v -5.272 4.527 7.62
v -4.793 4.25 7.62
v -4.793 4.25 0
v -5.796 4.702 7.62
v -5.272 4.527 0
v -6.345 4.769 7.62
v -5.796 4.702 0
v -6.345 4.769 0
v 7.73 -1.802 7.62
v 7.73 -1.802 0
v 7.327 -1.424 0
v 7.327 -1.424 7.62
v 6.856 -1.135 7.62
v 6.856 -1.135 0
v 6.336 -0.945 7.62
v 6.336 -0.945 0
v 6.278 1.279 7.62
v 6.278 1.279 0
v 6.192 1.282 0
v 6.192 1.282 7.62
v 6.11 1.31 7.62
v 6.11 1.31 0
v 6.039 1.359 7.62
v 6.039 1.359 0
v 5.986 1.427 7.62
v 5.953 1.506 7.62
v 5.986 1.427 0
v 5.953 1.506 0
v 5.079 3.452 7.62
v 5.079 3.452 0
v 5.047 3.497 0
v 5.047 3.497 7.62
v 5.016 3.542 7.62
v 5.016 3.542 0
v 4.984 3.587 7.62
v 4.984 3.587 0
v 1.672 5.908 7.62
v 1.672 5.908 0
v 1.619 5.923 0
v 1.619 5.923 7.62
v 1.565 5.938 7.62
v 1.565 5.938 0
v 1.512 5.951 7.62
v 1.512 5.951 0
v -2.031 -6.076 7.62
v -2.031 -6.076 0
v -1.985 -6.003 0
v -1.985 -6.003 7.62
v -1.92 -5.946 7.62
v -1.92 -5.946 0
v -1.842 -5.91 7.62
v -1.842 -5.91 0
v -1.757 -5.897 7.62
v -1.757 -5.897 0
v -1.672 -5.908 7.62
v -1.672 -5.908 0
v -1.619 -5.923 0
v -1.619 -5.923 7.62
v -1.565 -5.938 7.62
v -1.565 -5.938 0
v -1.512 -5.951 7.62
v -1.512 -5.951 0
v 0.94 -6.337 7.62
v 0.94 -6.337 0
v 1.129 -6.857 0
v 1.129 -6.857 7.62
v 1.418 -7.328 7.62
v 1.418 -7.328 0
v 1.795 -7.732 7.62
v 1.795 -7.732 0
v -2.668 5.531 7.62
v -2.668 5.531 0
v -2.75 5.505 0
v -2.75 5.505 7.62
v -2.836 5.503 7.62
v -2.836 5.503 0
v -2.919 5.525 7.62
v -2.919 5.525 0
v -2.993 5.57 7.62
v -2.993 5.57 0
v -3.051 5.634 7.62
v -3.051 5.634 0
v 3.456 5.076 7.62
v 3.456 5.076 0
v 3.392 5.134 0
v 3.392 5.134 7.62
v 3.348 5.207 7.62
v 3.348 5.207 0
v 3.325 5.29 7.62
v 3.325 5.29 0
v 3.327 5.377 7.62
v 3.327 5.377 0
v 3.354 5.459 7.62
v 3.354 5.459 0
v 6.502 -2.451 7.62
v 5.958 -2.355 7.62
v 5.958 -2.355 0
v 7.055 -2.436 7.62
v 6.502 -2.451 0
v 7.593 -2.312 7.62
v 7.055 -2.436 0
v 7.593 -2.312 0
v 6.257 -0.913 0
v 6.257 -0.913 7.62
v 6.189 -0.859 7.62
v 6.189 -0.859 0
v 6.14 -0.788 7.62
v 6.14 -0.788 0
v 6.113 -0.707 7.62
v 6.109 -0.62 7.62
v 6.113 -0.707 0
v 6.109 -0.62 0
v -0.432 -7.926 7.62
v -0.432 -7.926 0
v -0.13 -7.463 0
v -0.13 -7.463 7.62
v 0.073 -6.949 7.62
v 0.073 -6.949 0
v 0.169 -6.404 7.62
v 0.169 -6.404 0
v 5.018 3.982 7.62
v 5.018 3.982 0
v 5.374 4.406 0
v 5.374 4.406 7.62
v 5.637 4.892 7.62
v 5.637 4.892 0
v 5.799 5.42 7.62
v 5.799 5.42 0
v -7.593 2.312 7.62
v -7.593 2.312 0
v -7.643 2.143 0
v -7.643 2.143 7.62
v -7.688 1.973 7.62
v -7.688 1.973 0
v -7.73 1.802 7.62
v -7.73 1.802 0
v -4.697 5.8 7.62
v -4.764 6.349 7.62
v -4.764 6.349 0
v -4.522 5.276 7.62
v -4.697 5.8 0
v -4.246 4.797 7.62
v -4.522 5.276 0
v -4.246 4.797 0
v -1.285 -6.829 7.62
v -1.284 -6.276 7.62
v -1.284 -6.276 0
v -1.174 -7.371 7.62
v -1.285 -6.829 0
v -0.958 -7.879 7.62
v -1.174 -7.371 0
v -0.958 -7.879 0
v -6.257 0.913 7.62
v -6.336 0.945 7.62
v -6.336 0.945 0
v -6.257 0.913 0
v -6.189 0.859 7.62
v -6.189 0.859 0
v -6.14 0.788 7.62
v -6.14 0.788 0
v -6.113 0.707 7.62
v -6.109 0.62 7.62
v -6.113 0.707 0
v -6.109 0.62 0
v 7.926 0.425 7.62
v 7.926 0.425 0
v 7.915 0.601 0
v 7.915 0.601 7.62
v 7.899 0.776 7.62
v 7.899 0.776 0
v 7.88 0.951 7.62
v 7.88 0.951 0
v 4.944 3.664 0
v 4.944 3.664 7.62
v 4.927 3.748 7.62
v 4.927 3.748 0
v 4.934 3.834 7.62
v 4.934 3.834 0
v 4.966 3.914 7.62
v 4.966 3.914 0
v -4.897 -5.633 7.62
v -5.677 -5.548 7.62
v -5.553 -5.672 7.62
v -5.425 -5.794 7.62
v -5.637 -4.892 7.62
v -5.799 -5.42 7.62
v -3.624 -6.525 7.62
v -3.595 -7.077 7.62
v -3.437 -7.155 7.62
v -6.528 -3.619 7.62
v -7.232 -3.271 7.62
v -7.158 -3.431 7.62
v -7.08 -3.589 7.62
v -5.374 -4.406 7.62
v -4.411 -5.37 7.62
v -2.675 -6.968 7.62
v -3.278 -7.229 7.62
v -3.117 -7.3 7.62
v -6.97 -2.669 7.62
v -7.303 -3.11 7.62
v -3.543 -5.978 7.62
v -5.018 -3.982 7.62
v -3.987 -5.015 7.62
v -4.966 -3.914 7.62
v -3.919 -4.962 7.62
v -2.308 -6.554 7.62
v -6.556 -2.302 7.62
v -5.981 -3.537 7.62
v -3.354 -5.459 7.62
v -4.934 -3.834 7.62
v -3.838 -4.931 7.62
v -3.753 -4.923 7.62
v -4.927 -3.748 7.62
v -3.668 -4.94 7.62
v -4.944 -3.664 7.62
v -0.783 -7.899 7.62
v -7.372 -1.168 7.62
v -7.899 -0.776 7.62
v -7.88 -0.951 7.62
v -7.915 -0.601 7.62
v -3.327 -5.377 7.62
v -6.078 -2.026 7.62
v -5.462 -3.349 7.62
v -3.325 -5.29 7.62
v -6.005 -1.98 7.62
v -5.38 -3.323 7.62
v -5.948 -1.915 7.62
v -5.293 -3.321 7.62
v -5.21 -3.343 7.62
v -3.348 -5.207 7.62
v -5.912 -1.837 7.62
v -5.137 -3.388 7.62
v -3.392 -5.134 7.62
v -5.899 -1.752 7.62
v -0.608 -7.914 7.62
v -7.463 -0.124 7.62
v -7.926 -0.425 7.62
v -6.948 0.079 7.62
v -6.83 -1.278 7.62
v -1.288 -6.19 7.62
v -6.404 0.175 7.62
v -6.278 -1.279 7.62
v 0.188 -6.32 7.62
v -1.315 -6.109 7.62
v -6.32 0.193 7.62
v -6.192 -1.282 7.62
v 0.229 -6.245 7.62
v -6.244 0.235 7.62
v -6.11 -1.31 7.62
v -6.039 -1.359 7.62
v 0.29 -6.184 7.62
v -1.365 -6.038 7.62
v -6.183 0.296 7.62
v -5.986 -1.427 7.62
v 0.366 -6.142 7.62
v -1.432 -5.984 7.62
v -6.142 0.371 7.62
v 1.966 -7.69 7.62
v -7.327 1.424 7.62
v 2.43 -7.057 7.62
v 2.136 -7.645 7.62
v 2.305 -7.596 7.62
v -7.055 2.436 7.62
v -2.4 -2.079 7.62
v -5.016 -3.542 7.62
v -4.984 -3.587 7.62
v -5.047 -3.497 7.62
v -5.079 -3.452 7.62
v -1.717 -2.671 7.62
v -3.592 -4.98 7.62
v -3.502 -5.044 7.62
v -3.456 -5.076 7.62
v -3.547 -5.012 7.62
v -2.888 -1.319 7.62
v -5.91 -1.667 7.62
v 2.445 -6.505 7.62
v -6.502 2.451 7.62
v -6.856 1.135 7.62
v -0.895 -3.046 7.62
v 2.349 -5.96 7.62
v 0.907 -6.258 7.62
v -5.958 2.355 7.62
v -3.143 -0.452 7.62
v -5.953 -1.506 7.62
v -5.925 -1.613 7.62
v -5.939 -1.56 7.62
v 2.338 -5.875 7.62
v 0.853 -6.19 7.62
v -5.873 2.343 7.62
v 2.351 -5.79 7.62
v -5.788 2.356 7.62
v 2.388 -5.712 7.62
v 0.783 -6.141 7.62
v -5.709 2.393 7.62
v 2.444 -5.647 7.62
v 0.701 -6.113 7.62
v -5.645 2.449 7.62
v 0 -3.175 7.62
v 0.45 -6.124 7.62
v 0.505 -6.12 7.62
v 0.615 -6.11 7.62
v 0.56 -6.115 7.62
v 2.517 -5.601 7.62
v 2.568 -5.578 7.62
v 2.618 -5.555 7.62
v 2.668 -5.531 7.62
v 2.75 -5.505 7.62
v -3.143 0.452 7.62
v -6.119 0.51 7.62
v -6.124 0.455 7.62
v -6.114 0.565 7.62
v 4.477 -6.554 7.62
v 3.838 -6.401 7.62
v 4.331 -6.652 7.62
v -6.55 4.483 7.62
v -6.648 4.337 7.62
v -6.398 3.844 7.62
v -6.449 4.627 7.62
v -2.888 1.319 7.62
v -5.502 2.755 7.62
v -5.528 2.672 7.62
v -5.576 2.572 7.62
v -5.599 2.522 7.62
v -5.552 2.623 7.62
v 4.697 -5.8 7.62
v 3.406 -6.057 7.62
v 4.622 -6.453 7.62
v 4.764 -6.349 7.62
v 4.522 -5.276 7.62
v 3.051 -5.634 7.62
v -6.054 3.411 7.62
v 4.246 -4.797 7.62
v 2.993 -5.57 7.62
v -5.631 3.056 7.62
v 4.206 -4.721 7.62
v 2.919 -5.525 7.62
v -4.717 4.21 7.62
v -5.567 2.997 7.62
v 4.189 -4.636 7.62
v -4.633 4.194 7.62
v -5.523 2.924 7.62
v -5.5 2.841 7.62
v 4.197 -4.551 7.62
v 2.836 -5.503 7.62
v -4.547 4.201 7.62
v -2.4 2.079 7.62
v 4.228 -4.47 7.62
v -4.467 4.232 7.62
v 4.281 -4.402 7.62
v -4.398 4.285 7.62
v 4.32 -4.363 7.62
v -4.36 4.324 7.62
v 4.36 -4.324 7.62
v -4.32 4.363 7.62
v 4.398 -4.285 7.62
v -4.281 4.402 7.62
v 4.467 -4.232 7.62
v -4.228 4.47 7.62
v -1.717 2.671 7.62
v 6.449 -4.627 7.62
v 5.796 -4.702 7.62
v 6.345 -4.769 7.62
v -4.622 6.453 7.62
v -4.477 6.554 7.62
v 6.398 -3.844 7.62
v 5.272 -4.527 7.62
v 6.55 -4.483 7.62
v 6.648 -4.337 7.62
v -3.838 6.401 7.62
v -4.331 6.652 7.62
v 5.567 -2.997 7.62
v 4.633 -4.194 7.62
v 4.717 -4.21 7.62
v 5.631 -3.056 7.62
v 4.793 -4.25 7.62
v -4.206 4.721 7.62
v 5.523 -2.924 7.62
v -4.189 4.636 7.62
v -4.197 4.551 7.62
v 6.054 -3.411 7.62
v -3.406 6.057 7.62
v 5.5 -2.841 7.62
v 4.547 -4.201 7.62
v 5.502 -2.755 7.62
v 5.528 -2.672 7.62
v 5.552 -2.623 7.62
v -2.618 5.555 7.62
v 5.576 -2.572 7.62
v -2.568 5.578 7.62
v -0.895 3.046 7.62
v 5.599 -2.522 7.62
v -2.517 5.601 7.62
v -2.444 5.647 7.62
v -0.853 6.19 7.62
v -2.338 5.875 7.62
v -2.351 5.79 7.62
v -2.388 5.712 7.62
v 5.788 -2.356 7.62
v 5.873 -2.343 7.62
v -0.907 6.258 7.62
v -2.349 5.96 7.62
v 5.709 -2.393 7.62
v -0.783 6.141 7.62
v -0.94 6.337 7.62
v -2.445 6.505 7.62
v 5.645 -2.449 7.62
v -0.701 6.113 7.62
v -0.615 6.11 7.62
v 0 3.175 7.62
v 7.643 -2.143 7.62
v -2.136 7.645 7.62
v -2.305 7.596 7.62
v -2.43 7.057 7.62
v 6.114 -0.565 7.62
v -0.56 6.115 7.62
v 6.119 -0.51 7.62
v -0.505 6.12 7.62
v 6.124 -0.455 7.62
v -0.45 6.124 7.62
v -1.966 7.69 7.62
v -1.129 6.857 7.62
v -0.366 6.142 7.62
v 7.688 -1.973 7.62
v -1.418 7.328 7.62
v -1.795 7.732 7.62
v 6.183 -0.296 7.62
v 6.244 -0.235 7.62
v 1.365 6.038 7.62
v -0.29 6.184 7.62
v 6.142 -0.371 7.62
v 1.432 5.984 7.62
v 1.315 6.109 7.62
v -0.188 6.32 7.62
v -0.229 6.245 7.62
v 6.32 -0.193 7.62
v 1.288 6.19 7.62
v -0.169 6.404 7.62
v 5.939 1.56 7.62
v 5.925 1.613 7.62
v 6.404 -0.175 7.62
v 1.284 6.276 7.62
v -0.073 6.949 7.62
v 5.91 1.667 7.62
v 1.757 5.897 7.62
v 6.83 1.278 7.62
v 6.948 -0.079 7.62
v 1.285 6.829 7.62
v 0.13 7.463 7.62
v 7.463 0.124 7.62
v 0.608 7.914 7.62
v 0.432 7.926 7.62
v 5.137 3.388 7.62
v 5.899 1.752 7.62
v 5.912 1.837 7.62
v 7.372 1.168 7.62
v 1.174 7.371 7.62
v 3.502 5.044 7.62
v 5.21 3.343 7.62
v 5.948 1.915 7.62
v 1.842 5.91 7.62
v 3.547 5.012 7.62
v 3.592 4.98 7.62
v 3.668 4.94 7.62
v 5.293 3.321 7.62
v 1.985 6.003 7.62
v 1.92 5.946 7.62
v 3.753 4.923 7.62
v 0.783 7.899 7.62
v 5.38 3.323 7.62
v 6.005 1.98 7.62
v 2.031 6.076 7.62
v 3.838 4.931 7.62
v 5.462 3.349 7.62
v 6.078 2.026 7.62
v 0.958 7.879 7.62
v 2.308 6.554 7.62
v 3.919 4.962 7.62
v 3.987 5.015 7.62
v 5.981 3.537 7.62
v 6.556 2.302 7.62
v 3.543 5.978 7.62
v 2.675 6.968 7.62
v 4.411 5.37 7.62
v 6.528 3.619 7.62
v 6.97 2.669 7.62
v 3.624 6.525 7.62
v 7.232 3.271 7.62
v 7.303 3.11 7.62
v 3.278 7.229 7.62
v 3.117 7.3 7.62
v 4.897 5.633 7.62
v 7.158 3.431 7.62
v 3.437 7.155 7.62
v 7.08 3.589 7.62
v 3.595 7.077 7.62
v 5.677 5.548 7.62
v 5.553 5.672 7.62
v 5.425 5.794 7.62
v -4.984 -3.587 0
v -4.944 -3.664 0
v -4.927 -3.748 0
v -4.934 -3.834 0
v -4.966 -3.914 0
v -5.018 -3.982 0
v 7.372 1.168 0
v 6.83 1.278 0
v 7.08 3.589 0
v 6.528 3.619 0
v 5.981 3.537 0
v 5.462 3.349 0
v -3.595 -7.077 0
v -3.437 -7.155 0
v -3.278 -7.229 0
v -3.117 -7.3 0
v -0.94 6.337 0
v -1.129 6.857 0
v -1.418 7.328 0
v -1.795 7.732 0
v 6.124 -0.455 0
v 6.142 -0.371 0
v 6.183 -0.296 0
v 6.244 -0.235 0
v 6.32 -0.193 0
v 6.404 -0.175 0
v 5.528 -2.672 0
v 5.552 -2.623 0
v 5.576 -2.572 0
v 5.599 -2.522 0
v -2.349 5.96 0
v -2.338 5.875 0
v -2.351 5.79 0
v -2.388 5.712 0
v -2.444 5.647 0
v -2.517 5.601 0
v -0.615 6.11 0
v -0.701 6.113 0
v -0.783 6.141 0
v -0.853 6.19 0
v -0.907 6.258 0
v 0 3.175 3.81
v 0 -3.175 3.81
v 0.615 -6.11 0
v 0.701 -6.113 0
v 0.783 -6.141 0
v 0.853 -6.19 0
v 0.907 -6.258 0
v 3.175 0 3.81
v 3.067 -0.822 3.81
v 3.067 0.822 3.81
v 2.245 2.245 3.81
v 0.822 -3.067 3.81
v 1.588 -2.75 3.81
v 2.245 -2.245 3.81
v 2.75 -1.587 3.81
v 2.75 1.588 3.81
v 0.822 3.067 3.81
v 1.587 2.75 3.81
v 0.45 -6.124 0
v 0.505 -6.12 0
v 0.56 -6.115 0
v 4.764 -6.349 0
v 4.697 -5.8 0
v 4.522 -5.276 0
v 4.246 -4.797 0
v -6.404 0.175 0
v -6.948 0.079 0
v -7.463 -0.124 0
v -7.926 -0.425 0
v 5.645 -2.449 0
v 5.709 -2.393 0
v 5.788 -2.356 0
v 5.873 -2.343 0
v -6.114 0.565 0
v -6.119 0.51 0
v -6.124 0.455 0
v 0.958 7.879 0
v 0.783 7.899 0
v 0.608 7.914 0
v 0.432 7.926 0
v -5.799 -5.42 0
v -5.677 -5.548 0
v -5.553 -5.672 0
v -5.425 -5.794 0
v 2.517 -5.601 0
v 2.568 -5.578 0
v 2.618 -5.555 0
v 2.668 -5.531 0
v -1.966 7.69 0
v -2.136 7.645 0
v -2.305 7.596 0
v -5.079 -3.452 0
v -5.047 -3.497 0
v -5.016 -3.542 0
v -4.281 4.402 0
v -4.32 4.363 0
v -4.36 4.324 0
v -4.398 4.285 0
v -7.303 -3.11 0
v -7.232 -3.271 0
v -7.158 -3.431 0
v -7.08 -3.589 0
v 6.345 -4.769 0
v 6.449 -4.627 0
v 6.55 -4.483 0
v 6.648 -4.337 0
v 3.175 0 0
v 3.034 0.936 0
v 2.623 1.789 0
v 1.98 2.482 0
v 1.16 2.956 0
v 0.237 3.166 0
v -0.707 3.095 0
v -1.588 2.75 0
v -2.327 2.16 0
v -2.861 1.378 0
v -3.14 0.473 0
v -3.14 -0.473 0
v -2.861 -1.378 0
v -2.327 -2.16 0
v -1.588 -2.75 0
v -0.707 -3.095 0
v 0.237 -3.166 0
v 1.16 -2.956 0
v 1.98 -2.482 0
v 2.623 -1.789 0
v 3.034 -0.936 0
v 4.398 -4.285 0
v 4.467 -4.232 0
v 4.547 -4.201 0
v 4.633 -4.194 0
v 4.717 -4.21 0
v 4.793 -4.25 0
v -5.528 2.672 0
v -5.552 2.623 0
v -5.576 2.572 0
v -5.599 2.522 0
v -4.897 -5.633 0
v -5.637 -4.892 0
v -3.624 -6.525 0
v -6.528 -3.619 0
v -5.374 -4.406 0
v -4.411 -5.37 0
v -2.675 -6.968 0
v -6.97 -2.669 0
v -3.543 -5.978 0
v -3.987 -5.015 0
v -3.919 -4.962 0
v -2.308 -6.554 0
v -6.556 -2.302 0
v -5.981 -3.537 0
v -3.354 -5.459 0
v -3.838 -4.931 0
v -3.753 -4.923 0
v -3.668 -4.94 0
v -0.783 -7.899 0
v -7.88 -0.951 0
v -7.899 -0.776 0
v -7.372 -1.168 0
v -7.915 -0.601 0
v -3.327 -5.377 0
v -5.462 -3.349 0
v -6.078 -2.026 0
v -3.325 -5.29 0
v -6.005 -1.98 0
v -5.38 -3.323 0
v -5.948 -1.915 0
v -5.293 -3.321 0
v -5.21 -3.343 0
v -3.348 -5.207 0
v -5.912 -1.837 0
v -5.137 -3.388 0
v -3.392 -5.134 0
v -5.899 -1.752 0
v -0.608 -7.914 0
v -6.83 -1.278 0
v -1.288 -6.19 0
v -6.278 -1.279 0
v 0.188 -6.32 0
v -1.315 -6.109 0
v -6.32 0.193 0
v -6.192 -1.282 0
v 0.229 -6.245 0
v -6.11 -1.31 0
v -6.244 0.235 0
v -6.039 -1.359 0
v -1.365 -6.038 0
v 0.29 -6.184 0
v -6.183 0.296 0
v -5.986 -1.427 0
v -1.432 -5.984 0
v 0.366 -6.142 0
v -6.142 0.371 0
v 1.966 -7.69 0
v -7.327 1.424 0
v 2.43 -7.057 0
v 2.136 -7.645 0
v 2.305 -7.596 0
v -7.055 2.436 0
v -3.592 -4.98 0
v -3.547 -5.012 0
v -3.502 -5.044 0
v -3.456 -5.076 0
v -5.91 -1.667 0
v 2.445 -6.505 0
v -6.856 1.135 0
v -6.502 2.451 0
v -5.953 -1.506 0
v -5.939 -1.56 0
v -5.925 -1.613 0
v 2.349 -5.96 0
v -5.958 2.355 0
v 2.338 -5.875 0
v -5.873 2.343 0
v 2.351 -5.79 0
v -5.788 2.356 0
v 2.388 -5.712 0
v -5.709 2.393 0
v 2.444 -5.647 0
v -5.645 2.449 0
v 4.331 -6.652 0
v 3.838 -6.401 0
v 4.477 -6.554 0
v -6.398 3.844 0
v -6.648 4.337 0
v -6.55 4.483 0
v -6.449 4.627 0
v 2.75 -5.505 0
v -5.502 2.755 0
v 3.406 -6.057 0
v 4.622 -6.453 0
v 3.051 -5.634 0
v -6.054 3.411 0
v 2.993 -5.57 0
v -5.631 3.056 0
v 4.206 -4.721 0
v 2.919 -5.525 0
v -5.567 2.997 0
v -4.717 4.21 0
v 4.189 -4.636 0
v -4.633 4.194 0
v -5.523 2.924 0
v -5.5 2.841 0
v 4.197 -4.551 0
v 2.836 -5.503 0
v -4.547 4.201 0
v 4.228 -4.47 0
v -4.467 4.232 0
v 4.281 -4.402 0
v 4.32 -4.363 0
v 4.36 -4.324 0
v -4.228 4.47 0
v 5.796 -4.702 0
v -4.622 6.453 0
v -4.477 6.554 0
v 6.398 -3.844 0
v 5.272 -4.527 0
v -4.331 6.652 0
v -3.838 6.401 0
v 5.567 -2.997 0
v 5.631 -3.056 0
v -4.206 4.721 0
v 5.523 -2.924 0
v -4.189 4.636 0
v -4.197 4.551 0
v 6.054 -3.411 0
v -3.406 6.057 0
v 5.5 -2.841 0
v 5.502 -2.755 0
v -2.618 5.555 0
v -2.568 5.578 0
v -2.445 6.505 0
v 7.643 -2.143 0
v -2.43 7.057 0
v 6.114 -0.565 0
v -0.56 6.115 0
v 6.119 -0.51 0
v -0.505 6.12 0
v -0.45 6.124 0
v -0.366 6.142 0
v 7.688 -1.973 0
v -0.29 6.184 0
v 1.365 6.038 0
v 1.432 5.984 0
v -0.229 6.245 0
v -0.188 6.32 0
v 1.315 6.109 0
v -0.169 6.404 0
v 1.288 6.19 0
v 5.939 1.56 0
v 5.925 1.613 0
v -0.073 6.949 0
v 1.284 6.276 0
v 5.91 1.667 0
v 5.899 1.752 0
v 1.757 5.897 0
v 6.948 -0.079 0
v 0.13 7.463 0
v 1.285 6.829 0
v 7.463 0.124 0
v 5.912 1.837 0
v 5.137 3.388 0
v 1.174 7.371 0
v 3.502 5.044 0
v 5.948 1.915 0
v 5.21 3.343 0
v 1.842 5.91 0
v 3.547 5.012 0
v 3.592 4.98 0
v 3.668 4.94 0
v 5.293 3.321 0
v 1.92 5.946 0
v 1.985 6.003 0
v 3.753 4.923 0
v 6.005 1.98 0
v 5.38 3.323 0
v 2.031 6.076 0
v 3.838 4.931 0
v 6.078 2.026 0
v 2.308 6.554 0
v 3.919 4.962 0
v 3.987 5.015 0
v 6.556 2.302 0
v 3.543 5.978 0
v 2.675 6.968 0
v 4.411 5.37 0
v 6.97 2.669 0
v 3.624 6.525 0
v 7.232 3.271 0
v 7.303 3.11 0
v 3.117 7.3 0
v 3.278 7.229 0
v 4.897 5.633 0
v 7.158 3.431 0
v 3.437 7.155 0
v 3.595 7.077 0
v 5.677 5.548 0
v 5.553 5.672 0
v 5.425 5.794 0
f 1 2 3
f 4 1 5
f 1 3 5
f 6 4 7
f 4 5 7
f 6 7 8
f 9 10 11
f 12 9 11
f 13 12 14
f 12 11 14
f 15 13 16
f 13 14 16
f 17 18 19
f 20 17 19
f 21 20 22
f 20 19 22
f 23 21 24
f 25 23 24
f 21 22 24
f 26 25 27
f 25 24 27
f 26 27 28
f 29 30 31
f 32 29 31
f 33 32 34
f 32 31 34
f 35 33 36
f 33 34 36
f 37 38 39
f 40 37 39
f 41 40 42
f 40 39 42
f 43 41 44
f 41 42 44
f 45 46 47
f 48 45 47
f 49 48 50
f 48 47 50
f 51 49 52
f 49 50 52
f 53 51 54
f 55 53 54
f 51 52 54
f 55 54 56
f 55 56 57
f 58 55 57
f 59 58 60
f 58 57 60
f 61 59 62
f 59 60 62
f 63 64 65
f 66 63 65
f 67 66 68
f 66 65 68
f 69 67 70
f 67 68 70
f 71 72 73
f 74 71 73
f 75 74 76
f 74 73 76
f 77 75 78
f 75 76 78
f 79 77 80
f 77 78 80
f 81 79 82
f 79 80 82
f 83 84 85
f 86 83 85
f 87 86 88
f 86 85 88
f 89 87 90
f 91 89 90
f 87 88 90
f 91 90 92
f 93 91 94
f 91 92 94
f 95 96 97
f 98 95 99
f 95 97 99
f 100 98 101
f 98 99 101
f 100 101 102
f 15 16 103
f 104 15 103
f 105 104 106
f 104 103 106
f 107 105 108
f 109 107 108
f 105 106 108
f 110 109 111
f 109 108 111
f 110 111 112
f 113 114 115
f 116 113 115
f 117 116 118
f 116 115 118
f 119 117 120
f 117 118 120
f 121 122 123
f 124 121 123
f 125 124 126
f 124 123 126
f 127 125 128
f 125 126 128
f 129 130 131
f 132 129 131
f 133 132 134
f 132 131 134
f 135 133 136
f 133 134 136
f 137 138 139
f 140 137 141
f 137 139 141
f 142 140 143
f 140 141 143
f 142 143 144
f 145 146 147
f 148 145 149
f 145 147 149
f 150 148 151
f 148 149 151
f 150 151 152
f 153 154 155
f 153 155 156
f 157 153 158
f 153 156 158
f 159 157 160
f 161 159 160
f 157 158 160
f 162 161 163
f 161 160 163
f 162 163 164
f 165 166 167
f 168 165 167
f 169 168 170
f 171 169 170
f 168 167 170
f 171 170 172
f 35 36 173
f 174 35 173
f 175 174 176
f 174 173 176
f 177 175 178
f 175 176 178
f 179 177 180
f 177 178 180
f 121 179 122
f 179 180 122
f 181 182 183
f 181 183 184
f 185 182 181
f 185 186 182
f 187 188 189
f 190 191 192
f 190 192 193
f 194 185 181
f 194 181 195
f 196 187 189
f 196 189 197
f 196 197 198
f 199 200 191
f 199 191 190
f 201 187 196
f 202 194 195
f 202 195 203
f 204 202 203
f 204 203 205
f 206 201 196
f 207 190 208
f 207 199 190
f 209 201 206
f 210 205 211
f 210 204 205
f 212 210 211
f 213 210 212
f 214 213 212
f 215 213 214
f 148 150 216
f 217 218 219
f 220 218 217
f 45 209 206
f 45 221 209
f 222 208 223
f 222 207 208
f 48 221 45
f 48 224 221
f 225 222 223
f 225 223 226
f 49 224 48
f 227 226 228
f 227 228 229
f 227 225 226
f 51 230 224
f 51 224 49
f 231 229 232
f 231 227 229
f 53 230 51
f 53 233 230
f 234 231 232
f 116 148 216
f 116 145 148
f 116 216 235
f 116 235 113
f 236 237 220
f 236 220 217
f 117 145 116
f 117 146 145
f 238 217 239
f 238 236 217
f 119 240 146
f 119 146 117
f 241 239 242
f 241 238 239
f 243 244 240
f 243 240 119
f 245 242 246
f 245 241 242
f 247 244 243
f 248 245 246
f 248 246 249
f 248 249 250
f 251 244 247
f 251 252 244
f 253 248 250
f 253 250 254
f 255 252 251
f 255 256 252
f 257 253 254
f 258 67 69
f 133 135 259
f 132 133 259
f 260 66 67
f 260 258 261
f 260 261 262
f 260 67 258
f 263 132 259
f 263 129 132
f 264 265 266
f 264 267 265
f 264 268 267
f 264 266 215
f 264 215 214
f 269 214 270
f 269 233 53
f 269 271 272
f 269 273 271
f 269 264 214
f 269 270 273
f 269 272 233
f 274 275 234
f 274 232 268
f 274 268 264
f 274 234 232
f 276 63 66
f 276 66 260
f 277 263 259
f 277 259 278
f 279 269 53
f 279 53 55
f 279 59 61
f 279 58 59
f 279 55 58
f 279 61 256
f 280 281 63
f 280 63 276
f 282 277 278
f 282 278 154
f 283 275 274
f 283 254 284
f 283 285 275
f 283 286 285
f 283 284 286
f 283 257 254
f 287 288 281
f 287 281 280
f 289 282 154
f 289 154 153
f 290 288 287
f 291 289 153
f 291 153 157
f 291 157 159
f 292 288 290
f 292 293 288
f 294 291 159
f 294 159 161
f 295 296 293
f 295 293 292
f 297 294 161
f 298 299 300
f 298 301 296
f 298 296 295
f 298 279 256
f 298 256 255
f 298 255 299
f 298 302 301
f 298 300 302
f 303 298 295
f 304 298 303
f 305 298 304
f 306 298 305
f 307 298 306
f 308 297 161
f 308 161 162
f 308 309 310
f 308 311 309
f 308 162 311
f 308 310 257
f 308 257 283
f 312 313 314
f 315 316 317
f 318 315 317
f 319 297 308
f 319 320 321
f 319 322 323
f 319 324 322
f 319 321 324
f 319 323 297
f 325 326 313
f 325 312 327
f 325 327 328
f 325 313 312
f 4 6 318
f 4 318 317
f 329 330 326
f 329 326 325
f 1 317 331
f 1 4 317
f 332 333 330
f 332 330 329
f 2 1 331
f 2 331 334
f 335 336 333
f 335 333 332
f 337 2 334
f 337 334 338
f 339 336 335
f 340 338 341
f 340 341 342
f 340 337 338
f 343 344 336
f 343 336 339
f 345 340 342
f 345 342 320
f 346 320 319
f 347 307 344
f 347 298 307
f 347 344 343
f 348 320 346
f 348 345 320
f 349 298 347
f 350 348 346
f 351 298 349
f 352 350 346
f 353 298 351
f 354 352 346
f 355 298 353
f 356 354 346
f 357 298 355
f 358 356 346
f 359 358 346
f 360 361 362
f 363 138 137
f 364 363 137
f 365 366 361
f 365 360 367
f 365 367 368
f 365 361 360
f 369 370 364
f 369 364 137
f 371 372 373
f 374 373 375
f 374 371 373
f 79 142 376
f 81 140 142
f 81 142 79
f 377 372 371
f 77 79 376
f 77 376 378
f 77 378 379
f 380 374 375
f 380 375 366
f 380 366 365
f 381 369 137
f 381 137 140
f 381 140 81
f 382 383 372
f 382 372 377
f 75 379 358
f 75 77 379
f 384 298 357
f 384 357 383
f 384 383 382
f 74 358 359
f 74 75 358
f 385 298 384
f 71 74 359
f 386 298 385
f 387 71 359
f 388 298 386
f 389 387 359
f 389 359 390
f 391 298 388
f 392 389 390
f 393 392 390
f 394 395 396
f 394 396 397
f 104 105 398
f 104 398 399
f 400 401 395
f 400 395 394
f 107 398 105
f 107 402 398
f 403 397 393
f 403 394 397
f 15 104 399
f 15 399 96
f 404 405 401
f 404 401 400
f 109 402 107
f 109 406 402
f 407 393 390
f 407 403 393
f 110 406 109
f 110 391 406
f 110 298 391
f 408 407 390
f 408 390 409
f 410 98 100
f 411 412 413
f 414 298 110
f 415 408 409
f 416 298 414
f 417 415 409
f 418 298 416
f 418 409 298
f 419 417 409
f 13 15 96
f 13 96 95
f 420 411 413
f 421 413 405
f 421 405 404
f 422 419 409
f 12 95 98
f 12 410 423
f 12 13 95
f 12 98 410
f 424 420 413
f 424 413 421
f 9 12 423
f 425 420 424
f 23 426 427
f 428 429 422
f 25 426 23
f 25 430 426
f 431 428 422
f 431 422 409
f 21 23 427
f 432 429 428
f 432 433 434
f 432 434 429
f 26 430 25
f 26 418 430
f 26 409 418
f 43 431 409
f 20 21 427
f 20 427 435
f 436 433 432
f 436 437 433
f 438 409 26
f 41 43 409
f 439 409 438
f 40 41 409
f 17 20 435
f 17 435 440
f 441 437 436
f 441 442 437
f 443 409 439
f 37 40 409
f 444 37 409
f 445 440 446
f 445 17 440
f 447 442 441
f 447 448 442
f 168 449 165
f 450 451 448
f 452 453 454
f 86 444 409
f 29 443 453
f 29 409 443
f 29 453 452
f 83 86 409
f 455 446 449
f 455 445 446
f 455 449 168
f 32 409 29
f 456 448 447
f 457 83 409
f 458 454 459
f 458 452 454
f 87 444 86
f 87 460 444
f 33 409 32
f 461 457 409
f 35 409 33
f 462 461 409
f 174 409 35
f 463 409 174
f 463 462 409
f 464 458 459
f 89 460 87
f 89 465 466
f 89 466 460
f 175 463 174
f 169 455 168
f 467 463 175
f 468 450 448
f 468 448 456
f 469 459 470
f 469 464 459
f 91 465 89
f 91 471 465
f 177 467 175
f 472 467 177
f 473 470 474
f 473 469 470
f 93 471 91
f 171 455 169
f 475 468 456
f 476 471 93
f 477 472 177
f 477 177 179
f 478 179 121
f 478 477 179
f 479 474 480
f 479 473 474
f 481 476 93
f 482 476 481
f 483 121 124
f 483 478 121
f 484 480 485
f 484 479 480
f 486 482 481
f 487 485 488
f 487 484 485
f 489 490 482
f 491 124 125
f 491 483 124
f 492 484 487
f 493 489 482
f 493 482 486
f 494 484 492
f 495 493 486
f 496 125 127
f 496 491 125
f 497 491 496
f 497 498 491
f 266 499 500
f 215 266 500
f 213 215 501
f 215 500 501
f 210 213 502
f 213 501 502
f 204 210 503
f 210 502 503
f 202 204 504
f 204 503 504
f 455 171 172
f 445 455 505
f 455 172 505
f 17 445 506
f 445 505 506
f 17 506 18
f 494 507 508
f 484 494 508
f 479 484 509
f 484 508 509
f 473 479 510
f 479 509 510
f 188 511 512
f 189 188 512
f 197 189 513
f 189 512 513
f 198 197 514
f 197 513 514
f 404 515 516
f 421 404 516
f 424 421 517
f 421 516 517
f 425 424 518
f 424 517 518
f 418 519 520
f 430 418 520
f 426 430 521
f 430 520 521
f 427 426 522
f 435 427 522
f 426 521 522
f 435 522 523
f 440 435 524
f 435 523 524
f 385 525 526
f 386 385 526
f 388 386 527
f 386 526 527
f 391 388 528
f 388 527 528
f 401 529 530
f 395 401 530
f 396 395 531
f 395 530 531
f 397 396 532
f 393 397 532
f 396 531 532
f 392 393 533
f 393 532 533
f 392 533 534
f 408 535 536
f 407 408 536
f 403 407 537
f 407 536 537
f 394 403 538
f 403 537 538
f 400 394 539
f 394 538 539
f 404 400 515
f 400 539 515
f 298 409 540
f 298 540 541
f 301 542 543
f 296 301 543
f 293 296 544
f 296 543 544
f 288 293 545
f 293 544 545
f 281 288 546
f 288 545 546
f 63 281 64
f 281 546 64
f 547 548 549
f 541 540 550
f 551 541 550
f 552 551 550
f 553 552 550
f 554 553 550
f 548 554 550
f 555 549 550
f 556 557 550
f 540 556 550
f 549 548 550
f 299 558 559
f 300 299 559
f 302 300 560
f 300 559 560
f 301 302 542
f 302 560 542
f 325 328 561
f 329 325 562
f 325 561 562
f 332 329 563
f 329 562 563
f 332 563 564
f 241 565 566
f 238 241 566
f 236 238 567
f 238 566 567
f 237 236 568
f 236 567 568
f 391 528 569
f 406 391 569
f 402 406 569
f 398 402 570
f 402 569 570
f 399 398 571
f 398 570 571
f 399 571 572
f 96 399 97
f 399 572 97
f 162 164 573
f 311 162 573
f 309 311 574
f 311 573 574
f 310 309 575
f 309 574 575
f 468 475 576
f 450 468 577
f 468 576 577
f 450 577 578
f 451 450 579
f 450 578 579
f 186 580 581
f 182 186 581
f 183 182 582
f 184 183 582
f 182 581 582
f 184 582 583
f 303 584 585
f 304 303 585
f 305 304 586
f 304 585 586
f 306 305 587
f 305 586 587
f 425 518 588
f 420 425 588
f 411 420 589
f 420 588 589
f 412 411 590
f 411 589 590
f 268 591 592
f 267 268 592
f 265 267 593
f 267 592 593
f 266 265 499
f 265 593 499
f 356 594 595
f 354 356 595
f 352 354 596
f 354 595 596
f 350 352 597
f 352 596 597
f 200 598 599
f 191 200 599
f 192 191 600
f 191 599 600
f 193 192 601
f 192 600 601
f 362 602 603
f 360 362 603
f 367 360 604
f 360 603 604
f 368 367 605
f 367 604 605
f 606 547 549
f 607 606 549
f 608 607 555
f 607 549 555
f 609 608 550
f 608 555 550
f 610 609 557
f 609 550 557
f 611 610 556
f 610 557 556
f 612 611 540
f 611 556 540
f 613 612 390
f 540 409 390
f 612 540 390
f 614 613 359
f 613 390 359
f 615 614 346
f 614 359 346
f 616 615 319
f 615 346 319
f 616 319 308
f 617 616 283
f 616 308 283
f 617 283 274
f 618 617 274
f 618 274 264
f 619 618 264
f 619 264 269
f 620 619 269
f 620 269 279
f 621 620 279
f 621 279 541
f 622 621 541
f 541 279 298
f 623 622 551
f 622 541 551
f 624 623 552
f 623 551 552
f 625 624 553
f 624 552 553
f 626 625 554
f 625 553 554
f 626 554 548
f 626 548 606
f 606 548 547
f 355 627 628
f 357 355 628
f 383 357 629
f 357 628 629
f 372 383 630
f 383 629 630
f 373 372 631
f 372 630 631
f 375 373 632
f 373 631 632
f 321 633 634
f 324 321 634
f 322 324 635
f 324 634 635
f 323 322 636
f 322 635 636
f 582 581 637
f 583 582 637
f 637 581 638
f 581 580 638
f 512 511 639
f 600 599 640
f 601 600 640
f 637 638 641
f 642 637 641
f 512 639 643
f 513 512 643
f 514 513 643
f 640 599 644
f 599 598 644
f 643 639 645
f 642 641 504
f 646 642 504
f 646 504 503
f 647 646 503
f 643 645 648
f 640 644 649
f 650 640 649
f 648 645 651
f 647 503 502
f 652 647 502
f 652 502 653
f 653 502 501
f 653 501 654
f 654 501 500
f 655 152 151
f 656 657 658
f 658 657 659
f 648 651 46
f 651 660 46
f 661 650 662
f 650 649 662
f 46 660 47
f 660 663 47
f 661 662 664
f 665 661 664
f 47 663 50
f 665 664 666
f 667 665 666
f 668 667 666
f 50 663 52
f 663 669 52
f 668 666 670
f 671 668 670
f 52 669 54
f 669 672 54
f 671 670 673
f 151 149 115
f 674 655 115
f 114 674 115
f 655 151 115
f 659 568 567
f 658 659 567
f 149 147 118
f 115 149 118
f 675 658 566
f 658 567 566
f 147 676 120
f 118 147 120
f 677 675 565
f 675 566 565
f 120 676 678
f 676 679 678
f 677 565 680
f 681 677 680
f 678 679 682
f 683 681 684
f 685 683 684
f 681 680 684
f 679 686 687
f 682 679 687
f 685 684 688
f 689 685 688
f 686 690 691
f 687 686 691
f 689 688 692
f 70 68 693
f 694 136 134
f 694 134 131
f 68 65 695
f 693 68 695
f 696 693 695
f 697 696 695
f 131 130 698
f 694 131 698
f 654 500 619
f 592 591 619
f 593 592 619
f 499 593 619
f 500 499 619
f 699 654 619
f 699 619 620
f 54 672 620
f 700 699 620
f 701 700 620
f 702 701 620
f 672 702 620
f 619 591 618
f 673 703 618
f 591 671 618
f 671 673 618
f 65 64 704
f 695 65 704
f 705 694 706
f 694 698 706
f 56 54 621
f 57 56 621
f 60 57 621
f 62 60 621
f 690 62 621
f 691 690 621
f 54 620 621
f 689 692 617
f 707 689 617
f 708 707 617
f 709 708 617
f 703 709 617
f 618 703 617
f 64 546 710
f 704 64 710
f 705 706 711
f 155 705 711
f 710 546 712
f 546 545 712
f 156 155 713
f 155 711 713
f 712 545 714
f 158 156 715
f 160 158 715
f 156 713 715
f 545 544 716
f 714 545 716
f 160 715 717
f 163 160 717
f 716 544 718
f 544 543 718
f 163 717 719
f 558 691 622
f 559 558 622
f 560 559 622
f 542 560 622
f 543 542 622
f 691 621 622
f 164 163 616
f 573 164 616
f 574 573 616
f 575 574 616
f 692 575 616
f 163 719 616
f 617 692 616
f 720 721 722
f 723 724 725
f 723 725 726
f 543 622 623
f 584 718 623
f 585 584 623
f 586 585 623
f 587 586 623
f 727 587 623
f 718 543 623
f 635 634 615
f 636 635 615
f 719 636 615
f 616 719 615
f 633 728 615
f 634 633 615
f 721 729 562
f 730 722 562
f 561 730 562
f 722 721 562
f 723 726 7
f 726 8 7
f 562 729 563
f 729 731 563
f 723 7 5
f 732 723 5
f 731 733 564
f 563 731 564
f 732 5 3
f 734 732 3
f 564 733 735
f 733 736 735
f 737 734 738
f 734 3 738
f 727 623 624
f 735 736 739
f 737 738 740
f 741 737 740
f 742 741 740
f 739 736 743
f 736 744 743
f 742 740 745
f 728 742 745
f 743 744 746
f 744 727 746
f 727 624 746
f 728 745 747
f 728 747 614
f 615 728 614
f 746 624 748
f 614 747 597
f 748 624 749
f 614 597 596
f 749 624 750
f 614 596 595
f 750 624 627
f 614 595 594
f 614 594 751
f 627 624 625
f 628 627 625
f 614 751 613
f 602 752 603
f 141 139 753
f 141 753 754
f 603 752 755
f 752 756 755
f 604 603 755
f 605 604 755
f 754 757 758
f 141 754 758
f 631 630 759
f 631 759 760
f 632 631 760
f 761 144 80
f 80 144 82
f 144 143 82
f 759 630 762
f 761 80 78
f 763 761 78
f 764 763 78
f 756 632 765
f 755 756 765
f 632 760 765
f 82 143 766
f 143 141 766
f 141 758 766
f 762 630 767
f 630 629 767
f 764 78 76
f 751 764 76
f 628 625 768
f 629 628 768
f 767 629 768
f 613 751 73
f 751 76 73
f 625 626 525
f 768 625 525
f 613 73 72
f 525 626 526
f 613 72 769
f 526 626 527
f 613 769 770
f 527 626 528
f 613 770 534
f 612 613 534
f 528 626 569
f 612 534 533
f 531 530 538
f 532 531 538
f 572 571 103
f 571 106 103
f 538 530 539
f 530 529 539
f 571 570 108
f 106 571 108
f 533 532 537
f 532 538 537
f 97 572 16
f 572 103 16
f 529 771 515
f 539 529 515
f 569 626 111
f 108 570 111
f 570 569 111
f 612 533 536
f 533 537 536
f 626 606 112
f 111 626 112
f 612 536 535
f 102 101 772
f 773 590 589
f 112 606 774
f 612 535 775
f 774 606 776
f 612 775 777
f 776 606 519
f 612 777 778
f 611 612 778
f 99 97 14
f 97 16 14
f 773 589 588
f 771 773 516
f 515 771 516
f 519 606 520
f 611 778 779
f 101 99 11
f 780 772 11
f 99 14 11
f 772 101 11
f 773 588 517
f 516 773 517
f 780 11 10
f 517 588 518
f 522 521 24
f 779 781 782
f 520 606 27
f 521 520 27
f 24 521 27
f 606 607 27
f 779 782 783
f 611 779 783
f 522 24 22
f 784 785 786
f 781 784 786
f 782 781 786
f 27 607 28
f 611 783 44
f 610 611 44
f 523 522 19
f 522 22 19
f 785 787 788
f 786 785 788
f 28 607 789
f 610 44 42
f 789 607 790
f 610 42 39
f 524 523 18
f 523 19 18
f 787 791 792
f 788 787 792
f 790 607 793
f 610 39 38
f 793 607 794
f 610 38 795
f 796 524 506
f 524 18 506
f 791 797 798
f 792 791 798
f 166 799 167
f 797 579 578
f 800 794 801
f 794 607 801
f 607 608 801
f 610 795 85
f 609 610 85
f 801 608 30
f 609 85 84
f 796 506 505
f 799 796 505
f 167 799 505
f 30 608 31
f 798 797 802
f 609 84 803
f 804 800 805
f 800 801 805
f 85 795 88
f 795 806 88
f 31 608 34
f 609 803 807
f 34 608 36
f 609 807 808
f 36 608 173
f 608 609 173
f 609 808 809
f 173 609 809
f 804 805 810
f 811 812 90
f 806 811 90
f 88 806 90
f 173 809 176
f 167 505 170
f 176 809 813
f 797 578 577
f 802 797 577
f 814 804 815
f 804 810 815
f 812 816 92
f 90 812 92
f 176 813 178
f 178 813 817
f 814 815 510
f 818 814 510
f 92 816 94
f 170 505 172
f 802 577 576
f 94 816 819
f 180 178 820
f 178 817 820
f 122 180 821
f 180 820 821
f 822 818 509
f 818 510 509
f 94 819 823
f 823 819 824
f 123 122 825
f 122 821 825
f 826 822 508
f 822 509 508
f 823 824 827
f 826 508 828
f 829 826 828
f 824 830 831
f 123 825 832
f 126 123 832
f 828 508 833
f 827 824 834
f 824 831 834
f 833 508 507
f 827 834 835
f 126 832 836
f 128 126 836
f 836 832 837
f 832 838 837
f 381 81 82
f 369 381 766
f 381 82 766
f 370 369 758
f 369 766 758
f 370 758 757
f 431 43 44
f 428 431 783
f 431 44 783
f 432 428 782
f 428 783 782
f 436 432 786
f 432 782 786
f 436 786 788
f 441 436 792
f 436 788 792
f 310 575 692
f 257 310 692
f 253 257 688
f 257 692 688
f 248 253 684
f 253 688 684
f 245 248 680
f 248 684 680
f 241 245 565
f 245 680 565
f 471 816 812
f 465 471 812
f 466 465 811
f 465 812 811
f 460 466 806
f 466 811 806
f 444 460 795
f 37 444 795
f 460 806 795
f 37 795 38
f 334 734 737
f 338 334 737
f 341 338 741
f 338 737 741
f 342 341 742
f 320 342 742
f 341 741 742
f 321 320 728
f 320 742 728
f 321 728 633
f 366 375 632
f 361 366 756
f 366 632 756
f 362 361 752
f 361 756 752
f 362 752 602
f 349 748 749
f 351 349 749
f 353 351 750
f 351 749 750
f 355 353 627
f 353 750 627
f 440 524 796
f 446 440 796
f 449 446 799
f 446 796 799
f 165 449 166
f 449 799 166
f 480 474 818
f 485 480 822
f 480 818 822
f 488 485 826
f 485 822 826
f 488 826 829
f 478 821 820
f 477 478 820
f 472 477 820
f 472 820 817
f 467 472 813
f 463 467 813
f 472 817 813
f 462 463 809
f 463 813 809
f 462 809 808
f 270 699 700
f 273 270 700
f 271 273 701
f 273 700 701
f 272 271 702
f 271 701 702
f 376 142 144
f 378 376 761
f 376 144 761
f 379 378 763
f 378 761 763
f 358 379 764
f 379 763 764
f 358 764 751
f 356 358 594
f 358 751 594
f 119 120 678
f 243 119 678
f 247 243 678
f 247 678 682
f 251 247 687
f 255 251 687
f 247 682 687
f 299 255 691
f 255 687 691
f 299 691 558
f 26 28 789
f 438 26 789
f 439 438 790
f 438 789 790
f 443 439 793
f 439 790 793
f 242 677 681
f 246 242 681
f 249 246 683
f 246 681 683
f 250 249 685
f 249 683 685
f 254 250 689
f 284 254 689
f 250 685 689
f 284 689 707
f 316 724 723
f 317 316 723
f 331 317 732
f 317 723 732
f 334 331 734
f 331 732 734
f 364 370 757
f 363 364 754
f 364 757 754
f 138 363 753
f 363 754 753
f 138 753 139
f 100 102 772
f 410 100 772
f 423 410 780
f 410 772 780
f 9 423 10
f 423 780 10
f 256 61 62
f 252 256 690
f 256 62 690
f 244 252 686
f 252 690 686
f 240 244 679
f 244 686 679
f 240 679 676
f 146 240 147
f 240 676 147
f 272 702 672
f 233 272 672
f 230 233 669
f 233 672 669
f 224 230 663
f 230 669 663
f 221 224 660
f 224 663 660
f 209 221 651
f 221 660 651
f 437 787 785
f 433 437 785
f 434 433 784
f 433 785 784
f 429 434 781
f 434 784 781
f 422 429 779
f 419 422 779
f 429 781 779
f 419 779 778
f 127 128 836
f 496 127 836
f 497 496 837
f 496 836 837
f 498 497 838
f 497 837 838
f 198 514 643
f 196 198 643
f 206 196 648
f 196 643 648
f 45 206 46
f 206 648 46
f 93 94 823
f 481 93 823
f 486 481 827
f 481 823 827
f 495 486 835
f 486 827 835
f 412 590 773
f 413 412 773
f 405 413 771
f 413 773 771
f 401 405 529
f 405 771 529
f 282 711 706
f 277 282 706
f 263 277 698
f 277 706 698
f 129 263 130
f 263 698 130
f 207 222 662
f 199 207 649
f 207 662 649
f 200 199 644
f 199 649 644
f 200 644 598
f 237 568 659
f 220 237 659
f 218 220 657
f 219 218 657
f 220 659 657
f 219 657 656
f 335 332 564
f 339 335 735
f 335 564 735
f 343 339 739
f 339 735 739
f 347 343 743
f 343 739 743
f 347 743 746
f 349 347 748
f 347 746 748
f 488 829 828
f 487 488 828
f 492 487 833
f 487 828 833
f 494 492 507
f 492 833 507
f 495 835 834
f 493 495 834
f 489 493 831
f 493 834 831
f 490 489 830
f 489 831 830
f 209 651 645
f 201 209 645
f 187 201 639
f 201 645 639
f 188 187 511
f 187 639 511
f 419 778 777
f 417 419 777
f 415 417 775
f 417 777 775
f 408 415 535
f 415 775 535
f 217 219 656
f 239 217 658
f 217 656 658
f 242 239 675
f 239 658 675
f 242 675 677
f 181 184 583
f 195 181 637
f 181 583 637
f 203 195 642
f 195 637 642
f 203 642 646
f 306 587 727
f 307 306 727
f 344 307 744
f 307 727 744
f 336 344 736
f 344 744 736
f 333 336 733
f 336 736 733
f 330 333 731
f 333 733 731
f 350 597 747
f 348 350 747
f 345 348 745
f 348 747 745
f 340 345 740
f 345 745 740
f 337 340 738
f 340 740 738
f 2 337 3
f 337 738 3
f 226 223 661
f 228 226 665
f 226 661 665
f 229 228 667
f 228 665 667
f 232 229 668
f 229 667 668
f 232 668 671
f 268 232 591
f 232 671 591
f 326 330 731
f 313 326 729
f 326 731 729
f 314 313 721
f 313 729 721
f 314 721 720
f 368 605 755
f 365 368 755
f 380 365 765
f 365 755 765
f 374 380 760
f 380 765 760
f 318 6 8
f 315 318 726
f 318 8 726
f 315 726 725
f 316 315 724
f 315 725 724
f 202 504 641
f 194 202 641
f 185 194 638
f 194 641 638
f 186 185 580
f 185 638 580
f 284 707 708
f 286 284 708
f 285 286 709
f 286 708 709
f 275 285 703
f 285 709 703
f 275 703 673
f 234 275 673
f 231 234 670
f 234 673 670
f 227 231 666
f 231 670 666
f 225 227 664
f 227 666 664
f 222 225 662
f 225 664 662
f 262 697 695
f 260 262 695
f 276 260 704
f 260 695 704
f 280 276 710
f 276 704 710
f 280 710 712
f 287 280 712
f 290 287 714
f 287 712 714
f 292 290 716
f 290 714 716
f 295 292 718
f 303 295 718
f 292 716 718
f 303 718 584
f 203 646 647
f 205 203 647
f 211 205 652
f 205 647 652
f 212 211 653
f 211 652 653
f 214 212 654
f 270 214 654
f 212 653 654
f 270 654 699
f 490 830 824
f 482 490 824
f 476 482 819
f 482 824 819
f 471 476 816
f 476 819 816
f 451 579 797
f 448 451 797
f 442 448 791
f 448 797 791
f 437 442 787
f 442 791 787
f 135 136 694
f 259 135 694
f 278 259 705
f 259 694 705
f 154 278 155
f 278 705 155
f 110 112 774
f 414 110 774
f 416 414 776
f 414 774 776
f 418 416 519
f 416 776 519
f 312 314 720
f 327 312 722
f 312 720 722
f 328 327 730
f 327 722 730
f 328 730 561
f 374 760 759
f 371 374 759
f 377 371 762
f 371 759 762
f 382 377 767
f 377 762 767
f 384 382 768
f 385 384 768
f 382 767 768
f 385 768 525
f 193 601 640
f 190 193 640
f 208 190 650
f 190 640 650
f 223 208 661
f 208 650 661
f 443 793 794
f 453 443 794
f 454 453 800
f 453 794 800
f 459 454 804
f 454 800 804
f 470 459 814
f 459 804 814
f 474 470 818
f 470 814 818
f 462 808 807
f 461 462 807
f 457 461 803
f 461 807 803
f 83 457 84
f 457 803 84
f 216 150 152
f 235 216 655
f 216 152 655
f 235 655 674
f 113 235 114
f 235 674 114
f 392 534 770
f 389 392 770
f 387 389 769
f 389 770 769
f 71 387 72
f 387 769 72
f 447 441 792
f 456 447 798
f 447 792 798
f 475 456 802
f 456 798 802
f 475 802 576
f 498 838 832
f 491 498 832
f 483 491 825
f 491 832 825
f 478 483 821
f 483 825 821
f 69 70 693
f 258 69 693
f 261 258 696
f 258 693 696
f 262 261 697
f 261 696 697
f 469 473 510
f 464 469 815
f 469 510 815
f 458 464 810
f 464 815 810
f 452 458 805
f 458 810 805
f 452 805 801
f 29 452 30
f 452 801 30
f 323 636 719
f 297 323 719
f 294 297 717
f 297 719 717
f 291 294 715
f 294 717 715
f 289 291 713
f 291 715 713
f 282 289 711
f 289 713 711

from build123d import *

# Parameters (mm, degrees)
SKETCH3_R           = 7.9375
GEARBODY_DEPTH      = 7.62
TOOTHCUT_DEPTH      = 8.62
CIRPATTERN1_COUNT   = 18
BOREDIA_R           = 3.175
BORE_DEPTH          = 12700
BOSS_EXTRUDE1_DEPTH = 3.81


with BuildPart() as part:
    # Sketch3 → gearBody (new body)
    with BuildSketch(Plane.XY):
        Circle(SKETCH3_R)
    extrude(amount=GEARBODY_DEPTH)

    # Sketch2 → toothCut (cut, through all)
    with BuildSketch(Plane.XY):
        with BuildLine():
            ThreePointArc((6.109024448, -0.620440562), (6.116845087, -0.537896263), (6.123550449, -0.45525389))
            ThreePointArc((6.123550449, -0.45525389), (6.211734547, -0.262957543), (6.404089586, -0.174901543))
            ThreePointArc((6.404089586, -0.174901543), (7.575851051, 0.185269566), (8.474852534, 1.018662927))
            ThreePointArc((8.474852534, 1.018662927), (8.503040528, -0.747730842), (8.167006715, -2.482096081))
            ThreePointArc((8.167006715, -2.482096081), (7.427249601, -1.504595405), (6.336329857, -0.945451173))
            ThreePointArc((6.336329857, -0.945451173), (6.162294814, -0.825175973), (6.109024448, -0.620440562))
        make_face()
    toothcut = extrude(amount=TOOTHCUT_DEPTH, mode=Mode.SUBTRACT)

    # CirPattern1: toothCut ×18 about axis
    cirpattern1_axis = Axis((0, 0, 0), (0, 0, 1))
    for i in range(1, CIRPATTERN1_COUNT):
        add(toothcut.rotate(cirpattern1_axis, i * 360 / CIRPATTERN1_COUNT), mode=Mode.SUBTRACT)

    # boreDia → bore (cut, symmetric)
    with BuildSketch(Plane.XY):
        Circle(BOREDIA_R)
    extrude(amount=BORE_DEPTH, both=True, mode=Mode.SUBTRACT)

    # Sketch5 → Boss-Extrude1 (add)
    with BuildSketch(Plane.XY.offset(7.62)):
        with BuildLine():
            Line((0, 3.175), (0, -3.175))
            ThreePointArc((0, -3.175), (3.175, 0), (0, 3.175))
        make_face()
    extrude(amount=-BOSS_EXTRUDE1_DEPTH)


solid = part.part
